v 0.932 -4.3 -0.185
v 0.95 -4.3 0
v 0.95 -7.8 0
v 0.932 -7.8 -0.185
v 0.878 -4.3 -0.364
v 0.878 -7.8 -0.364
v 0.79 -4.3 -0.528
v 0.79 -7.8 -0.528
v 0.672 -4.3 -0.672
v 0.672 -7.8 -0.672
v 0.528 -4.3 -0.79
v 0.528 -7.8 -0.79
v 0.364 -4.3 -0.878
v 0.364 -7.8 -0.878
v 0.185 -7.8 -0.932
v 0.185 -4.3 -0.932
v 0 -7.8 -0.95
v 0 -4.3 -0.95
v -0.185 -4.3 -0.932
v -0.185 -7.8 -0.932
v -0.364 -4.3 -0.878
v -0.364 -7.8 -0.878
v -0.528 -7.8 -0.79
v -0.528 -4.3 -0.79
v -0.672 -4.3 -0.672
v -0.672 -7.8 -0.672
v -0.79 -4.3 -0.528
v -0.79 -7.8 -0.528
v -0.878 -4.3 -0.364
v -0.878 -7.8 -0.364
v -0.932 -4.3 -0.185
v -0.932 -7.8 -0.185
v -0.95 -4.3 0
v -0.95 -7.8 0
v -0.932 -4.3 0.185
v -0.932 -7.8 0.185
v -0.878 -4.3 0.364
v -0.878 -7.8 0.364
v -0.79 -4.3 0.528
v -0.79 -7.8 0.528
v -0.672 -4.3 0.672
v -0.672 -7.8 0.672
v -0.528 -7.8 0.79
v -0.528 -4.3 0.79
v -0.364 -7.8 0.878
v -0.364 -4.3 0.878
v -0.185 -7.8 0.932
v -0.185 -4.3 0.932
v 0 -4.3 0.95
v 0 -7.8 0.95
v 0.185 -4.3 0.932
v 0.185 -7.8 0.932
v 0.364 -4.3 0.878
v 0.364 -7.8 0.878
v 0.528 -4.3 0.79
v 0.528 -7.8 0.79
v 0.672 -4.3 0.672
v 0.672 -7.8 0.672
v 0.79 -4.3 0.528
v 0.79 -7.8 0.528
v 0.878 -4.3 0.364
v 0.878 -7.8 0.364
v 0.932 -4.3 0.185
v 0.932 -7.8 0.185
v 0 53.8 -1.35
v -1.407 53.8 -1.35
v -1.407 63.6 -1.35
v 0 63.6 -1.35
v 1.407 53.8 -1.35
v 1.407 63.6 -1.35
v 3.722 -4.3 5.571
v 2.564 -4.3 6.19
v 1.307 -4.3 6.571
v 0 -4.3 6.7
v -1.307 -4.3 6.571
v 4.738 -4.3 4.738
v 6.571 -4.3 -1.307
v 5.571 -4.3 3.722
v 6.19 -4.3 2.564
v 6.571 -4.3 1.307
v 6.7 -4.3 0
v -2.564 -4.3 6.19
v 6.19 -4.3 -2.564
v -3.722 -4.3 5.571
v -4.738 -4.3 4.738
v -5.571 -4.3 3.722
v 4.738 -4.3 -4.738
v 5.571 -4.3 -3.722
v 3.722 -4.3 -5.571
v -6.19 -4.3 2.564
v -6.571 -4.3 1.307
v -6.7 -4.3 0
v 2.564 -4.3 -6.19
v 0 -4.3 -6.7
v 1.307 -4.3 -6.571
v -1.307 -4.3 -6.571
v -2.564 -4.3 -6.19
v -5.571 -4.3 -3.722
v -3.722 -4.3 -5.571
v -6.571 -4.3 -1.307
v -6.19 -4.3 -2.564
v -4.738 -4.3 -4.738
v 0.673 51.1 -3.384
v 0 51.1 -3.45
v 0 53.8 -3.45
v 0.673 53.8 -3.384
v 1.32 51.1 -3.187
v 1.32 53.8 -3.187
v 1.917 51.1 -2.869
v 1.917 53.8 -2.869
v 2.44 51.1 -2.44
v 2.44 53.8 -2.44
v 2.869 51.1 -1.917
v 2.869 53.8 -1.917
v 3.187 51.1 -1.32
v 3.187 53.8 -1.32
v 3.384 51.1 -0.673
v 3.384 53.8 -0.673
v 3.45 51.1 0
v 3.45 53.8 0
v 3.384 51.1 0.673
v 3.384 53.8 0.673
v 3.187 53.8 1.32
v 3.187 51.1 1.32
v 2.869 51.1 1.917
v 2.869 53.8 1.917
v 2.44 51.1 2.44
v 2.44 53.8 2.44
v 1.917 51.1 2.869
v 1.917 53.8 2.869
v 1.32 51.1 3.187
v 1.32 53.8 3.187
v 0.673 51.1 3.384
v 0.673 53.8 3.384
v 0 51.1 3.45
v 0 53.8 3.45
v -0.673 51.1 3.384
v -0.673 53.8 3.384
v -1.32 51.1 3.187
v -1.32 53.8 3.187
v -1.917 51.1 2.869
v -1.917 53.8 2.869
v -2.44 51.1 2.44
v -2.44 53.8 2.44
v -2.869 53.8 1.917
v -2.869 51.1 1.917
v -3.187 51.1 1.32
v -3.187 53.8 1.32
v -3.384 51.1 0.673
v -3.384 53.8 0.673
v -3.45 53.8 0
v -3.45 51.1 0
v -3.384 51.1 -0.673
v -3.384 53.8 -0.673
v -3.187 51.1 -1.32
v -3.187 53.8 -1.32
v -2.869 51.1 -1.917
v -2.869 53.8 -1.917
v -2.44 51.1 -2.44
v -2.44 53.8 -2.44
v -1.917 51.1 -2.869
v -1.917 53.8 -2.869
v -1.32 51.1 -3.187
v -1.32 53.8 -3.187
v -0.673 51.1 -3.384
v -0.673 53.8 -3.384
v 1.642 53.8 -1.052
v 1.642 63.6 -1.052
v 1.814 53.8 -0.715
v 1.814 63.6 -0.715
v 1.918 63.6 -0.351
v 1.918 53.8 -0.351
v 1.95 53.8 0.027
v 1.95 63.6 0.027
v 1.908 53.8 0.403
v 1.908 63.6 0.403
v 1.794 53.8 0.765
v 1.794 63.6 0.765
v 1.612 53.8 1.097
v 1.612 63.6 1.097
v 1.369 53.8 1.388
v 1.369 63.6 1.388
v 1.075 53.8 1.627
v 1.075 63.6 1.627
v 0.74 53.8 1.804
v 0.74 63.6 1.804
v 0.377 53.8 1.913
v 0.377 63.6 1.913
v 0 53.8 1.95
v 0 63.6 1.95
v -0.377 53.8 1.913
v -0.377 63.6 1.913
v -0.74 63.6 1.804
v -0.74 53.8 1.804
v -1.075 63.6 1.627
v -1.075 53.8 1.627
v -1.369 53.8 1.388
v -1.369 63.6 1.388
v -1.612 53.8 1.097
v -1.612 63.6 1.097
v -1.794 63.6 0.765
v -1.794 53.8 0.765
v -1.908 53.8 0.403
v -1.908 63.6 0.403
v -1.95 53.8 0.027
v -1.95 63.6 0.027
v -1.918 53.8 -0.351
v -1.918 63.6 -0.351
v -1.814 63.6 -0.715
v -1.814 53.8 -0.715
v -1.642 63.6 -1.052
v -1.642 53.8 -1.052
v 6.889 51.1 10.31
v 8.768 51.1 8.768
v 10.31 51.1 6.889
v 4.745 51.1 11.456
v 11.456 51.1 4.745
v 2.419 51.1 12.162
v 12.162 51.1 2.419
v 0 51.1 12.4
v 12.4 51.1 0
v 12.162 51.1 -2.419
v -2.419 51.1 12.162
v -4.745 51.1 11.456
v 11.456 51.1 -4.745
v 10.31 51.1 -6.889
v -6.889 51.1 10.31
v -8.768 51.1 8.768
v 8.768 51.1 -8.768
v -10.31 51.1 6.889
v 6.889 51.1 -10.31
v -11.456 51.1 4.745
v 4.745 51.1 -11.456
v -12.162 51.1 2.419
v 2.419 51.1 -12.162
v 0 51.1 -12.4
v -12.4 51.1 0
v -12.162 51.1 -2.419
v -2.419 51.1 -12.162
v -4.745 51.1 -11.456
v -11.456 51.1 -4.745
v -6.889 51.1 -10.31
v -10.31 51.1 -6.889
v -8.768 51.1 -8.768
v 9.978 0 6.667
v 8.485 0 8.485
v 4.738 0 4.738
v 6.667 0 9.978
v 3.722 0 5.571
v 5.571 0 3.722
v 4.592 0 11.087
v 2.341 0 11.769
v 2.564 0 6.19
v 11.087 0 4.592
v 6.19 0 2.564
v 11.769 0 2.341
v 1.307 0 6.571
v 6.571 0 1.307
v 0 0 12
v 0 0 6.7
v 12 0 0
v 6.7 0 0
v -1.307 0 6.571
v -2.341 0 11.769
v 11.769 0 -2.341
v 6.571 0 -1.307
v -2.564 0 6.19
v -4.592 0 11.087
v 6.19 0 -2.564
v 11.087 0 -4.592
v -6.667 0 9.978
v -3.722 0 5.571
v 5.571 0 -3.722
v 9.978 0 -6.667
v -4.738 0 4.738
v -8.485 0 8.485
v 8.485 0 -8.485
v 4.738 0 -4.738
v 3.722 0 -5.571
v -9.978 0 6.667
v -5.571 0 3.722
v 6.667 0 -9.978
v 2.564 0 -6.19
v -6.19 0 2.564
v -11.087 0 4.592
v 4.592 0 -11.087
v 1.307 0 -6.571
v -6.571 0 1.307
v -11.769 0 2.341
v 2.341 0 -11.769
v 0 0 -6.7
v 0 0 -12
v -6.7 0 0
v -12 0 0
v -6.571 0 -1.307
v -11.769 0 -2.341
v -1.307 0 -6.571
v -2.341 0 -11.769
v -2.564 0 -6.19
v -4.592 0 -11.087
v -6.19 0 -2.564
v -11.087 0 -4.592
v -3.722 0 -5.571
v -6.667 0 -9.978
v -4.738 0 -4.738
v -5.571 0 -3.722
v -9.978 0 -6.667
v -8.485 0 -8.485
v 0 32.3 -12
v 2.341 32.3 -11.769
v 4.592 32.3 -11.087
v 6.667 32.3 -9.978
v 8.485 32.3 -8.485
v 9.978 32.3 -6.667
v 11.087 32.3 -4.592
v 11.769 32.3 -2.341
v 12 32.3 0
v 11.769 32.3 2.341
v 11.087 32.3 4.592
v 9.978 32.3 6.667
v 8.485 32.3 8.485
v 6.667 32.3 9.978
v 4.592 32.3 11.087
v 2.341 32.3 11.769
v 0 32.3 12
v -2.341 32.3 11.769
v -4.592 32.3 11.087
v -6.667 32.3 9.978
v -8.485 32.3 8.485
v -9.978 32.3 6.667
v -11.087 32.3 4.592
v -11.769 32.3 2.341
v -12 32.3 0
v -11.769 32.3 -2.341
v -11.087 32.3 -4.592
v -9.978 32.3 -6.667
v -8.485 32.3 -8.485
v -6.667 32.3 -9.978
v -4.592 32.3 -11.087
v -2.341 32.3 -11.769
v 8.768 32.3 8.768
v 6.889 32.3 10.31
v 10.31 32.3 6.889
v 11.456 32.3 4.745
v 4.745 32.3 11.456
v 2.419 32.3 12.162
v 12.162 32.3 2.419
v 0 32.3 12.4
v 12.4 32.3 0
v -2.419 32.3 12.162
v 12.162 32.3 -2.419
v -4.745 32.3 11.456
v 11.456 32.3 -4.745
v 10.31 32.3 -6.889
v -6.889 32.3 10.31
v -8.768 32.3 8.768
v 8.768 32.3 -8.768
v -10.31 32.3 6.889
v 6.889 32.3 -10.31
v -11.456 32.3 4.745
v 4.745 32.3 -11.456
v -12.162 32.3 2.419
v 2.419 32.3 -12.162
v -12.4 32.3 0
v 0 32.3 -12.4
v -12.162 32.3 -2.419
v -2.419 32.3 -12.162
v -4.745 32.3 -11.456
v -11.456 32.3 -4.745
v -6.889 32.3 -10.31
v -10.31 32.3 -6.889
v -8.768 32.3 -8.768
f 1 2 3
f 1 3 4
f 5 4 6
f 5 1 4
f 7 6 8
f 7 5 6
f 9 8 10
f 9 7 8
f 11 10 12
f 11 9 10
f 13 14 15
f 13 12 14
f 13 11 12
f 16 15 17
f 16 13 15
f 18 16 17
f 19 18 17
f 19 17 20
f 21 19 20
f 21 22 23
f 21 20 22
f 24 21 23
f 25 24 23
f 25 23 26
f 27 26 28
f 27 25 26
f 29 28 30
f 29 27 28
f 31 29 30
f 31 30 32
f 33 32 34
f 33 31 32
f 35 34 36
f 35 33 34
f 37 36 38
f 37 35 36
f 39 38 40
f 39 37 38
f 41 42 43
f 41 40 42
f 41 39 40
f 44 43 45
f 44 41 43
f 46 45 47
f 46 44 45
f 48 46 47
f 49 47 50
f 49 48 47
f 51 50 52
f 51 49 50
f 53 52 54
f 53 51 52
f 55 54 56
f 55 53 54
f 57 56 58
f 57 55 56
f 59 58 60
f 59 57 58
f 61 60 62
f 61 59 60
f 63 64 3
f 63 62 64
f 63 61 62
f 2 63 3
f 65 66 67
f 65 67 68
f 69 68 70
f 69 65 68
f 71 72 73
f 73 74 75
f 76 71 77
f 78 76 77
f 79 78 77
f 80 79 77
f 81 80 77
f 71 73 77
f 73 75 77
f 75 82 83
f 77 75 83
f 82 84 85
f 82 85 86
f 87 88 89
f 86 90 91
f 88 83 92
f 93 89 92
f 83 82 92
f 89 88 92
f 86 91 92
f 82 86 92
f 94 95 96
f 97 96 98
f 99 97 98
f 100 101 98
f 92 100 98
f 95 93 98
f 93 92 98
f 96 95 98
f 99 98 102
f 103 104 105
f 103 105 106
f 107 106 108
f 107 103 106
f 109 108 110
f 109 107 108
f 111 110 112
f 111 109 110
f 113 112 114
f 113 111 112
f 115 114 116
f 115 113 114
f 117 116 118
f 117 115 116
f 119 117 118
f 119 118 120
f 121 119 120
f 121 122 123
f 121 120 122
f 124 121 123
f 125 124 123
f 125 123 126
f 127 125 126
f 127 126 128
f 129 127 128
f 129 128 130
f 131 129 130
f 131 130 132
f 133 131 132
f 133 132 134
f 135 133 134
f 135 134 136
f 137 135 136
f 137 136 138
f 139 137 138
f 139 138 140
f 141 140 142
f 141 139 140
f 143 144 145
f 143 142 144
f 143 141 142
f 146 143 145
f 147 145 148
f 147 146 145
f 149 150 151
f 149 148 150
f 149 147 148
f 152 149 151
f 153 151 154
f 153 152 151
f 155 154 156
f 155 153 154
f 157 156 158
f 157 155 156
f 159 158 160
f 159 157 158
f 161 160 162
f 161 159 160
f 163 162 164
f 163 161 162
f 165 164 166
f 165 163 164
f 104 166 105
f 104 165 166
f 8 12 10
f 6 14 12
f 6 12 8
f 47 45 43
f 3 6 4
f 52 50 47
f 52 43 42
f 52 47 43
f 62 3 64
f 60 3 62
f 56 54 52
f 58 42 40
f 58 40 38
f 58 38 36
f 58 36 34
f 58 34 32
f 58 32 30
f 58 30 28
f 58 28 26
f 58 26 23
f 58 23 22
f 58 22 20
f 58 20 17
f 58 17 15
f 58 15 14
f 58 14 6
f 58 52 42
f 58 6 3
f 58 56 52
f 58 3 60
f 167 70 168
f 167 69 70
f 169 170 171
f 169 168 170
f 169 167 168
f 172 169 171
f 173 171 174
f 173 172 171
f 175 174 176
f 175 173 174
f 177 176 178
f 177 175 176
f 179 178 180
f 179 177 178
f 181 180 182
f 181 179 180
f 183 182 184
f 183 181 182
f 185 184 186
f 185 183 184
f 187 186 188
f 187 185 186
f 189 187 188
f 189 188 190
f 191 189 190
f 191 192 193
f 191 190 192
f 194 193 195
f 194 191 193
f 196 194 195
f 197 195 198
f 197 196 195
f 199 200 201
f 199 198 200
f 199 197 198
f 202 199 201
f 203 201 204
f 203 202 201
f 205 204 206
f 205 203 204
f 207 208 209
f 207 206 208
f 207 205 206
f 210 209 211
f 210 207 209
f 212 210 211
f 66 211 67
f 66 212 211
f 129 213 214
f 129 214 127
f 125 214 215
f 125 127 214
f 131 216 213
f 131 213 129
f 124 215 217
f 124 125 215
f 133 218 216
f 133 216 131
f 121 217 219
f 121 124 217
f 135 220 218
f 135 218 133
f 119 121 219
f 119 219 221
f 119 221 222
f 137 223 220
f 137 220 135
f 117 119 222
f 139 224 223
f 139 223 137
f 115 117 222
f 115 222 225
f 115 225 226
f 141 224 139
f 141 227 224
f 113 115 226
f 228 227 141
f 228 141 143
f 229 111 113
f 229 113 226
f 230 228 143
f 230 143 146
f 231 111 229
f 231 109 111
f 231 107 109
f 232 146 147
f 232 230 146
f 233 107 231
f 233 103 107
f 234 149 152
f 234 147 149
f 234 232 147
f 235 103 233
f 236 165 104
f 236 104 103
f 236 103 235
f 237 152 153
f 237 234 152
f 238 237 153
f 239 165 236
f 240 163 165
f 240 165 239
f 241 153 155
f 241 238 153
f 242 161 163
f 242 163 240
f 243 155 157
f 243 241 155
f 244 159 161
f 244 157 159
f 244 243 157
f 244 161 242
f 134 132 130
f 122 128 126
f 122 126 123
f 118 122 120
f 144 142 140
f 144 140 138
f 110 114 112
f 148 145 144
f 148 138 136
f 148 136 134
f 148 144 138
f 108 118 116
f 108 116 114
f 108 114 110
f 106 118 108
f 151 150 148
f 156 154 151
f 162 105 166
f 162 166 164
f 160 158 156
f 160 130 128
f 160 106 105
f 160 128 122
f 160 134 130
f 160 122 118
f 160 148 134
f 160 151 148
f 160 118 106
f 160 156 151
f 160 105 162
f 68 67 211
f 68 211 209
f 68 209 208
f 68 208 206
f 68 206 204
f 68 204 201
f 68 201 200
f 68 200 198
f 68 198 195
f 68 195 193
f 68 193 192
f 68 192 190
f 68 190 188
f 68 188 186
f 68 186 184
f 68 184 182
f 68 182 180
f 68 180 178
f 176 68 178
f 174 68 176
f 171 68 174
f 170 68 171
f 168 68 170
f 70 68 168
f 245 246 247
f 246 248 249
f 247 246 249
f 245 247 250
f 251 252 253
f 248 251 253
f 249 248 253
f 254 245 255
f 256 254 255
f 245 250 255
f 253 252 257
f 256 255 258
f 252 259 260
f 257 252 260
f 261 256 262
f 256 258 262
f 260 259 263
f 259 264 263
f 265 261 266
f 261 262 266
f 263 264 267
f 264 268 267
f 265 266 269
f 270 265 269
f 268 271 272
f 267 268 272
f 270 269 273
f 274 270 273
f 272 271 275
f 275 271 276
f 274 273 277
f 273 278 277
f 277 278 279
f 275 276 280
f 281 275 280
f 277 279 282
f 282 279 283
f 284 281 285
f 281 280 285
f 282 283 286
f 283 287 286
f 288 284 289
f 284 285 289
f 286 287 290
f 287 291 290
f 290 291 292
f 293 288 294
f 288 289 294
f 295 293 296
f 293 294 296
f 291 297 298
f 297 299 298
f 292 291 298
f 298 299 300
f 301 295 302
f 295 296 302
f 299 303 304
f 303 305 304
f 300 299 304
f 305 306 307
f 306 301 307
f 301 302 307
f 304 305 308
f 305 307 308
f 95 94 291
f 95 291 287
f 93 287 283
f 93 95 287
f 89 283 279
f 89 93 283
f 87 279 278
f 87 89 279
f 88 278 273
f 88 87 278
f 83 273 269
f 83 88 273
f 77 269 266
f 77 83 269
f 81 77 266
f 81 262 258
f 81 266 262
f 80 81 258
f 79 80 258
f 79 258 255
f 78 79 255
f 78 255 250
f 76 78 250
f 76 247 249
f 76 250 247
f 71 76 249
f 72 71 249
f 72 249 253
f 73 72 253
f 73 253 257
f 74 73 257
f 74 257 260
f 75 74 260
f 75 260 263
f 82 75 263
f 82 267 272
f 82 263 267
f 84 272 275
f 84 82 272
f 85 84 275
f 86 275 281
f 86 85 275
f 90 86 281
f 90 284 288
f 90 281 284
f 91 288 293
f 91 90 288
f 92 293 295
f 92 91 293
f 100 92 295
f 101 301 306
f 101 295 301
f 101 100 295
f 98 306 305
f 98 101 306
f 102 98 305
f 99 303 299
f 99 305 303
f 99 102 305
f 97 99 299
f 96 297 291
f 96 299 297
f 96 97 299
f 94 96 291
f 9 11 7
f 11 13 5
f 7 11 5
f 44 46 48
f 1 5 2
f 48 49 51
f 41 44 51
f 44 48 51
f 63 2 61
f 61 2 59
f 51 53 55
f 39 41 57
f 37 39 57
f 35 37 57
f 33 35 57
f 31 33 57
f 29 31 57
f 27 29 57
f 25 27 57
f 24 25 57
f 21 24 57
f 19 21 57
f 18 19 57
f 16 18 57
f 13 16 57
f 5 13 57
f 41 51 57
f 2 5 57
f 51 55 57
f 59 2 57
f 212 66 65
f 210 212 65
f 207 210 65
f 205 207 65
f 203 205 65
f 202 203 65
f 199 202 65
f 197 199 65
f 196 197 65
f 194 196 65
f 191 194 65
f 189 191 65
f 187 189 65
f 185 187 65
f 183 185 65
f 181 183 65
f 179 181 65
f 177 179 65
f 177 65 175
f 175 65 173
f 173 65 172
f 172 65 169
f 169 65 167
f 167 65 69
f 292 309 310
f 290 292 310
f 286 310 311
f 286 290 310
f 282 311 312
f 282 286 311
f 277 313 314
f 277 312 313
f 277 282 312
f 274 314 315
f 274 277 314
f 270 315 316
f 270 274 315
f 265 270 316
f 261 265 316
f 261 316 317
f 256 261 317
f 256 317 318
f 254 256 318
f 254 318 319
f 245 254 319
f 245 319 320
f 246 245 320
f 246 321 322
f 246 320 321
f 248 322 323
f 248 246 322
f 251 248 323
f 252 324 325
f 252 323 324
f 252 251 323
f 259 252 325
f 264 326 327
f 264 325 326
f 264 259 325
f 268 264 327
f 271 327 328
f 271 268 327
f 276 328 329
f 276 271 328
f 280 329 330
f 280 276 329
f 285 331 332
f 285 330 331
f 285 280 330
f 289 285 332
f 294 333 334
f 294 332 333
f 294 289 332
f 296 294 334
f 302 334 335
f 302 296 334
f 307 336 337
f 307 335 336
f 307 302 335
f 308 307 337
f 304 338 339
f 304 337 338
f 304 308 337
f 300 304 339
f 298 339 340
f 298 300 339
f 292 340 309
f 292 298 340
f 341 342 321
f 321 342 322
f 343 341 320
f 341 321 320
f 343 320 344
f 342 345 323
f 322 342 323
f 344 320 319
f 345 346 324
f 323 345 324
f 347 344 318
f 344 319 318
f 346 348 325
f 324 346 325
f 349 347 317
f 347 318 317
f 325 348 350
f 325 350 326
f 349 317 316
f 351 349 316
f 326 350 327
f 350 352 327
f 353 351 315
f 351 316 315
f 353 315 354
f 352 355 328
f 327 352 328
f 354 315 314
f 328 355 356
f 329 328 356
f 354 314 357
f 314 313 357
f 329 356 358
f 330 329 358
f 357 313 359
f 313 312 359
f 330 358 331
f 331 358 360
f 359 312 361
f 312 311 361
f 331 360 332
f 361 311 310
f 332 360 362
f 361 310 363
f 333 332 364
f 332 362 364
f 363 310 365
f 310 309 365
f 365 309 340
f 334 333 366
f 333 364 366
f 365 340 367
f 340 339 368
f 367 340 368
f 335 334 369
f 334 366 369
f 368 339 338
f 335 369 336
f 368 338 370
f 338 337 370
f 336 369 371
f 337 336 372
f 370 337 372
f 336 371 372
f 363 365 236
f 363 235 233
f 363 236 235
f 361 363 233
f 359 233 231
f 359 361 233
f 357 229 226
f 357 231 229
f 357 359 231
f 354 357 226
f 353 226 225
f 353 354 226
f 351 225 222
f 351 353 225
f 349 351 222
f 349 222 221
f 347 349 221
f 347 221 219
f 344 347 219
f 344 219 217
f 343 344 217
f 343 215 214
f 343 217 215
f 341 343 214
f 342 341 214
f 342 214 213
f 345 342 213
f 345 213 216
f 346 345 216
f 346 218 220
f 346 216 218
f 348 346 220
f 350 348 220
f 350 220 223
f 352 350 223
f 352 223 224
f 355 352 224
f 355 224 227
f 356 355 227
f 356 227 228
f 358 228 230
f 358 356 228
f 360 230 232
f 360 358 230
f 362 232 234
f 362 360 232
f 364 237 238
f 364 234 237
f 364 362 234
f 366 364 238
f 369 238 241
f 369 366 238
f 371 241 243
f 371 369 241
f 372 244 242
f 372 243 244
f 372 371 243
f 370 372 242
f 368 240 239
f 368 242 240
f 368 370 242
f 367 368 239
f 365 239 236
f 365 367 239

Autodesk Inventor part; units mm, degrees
ref_plane "YZ Plane" through (0, 0, 0) normal (1, 0, 0) x (0, 1, 0)
ref_plane "XZ Plane" through (0, 0, 0) normal (0, 1, 0) x (-1, 0, 0)
ref_plane "XY Plane" through (0, 0, 0) normal (0, 0, 1) x (1, 0, 0)
sketch "Esboço1" plane through (0, 0, 0) normal (1, 0, 0) x (0, 1, 0)
  line L0 (0, 0) -> (51.1, 0)
  line L1 (51.1, -3.45) -> (51.1, -12.4)
  line L2 (51.1, -12.4) -> (32.3, -12.4)
  line L3 (32.3, -12) -> (0, -12)
  line L4 (32.3, -12.4) -> (32.3, -12)
  line L5 (0, -6.7) -> (-4.3, -6.7)
  line L6 (0, -6.7) -> (0, -12)
  line L7 (-4.3, 0) -> (-4.3, -6.7)
  line L8 (51.1, 0) -> (53.8, 0)
  line L9 (53.8, 0) -> (53.8, -3.45)
  line L10 (53.8, -3.45) -> (51.1, -3.45)
  line L11 (0, 0) -> (-4.3, 0)
  dimension "d0" = 51.1
  dimension "d1" = 12.4
  dimension "d2" = 18.8
  dimension "d4" = 12
  dimension "d5" = 6.7
  dimension "d6" = 4.3
  dimension "d10" = 2.7
revolve "Revolução1" add sketch "Esboço1" angle 360 about axis through (0, 0, 0) along (0, 1, 0)
sketch "Esboço2" plane through (0, -4.3, 0) normal (0, -1, 0) x (1, 0, 0)
  circle A0 centre (0, 0) radius 0.95
  dimension "d15" = 1.9
extrude "Extrusão1" add sketch "Esboço2" along normal blind 3.5 separate body
sketch "Esboço3" plane through (0, 53.8, 0) normal (0, 1, 0) x (1, 0, 0)
  circle A0 centre (0, 0) radius 0.95 projected
  arc A1 (-1.4071, 1.35) -> (1.4071, 1.35) centre (0, 0) ccw
  line L0 (-1.4071, 1.35) -> (1.4071, 1.35)
  line L1 (0, 0.95) -> (0, 1.35)
  dimension "d18" = 3.9
extrude "Extrusão2" add sketch "Esboço3" along normal blind 9.8 separate body contours A0 | L0 A1
properties part number "Motor"
